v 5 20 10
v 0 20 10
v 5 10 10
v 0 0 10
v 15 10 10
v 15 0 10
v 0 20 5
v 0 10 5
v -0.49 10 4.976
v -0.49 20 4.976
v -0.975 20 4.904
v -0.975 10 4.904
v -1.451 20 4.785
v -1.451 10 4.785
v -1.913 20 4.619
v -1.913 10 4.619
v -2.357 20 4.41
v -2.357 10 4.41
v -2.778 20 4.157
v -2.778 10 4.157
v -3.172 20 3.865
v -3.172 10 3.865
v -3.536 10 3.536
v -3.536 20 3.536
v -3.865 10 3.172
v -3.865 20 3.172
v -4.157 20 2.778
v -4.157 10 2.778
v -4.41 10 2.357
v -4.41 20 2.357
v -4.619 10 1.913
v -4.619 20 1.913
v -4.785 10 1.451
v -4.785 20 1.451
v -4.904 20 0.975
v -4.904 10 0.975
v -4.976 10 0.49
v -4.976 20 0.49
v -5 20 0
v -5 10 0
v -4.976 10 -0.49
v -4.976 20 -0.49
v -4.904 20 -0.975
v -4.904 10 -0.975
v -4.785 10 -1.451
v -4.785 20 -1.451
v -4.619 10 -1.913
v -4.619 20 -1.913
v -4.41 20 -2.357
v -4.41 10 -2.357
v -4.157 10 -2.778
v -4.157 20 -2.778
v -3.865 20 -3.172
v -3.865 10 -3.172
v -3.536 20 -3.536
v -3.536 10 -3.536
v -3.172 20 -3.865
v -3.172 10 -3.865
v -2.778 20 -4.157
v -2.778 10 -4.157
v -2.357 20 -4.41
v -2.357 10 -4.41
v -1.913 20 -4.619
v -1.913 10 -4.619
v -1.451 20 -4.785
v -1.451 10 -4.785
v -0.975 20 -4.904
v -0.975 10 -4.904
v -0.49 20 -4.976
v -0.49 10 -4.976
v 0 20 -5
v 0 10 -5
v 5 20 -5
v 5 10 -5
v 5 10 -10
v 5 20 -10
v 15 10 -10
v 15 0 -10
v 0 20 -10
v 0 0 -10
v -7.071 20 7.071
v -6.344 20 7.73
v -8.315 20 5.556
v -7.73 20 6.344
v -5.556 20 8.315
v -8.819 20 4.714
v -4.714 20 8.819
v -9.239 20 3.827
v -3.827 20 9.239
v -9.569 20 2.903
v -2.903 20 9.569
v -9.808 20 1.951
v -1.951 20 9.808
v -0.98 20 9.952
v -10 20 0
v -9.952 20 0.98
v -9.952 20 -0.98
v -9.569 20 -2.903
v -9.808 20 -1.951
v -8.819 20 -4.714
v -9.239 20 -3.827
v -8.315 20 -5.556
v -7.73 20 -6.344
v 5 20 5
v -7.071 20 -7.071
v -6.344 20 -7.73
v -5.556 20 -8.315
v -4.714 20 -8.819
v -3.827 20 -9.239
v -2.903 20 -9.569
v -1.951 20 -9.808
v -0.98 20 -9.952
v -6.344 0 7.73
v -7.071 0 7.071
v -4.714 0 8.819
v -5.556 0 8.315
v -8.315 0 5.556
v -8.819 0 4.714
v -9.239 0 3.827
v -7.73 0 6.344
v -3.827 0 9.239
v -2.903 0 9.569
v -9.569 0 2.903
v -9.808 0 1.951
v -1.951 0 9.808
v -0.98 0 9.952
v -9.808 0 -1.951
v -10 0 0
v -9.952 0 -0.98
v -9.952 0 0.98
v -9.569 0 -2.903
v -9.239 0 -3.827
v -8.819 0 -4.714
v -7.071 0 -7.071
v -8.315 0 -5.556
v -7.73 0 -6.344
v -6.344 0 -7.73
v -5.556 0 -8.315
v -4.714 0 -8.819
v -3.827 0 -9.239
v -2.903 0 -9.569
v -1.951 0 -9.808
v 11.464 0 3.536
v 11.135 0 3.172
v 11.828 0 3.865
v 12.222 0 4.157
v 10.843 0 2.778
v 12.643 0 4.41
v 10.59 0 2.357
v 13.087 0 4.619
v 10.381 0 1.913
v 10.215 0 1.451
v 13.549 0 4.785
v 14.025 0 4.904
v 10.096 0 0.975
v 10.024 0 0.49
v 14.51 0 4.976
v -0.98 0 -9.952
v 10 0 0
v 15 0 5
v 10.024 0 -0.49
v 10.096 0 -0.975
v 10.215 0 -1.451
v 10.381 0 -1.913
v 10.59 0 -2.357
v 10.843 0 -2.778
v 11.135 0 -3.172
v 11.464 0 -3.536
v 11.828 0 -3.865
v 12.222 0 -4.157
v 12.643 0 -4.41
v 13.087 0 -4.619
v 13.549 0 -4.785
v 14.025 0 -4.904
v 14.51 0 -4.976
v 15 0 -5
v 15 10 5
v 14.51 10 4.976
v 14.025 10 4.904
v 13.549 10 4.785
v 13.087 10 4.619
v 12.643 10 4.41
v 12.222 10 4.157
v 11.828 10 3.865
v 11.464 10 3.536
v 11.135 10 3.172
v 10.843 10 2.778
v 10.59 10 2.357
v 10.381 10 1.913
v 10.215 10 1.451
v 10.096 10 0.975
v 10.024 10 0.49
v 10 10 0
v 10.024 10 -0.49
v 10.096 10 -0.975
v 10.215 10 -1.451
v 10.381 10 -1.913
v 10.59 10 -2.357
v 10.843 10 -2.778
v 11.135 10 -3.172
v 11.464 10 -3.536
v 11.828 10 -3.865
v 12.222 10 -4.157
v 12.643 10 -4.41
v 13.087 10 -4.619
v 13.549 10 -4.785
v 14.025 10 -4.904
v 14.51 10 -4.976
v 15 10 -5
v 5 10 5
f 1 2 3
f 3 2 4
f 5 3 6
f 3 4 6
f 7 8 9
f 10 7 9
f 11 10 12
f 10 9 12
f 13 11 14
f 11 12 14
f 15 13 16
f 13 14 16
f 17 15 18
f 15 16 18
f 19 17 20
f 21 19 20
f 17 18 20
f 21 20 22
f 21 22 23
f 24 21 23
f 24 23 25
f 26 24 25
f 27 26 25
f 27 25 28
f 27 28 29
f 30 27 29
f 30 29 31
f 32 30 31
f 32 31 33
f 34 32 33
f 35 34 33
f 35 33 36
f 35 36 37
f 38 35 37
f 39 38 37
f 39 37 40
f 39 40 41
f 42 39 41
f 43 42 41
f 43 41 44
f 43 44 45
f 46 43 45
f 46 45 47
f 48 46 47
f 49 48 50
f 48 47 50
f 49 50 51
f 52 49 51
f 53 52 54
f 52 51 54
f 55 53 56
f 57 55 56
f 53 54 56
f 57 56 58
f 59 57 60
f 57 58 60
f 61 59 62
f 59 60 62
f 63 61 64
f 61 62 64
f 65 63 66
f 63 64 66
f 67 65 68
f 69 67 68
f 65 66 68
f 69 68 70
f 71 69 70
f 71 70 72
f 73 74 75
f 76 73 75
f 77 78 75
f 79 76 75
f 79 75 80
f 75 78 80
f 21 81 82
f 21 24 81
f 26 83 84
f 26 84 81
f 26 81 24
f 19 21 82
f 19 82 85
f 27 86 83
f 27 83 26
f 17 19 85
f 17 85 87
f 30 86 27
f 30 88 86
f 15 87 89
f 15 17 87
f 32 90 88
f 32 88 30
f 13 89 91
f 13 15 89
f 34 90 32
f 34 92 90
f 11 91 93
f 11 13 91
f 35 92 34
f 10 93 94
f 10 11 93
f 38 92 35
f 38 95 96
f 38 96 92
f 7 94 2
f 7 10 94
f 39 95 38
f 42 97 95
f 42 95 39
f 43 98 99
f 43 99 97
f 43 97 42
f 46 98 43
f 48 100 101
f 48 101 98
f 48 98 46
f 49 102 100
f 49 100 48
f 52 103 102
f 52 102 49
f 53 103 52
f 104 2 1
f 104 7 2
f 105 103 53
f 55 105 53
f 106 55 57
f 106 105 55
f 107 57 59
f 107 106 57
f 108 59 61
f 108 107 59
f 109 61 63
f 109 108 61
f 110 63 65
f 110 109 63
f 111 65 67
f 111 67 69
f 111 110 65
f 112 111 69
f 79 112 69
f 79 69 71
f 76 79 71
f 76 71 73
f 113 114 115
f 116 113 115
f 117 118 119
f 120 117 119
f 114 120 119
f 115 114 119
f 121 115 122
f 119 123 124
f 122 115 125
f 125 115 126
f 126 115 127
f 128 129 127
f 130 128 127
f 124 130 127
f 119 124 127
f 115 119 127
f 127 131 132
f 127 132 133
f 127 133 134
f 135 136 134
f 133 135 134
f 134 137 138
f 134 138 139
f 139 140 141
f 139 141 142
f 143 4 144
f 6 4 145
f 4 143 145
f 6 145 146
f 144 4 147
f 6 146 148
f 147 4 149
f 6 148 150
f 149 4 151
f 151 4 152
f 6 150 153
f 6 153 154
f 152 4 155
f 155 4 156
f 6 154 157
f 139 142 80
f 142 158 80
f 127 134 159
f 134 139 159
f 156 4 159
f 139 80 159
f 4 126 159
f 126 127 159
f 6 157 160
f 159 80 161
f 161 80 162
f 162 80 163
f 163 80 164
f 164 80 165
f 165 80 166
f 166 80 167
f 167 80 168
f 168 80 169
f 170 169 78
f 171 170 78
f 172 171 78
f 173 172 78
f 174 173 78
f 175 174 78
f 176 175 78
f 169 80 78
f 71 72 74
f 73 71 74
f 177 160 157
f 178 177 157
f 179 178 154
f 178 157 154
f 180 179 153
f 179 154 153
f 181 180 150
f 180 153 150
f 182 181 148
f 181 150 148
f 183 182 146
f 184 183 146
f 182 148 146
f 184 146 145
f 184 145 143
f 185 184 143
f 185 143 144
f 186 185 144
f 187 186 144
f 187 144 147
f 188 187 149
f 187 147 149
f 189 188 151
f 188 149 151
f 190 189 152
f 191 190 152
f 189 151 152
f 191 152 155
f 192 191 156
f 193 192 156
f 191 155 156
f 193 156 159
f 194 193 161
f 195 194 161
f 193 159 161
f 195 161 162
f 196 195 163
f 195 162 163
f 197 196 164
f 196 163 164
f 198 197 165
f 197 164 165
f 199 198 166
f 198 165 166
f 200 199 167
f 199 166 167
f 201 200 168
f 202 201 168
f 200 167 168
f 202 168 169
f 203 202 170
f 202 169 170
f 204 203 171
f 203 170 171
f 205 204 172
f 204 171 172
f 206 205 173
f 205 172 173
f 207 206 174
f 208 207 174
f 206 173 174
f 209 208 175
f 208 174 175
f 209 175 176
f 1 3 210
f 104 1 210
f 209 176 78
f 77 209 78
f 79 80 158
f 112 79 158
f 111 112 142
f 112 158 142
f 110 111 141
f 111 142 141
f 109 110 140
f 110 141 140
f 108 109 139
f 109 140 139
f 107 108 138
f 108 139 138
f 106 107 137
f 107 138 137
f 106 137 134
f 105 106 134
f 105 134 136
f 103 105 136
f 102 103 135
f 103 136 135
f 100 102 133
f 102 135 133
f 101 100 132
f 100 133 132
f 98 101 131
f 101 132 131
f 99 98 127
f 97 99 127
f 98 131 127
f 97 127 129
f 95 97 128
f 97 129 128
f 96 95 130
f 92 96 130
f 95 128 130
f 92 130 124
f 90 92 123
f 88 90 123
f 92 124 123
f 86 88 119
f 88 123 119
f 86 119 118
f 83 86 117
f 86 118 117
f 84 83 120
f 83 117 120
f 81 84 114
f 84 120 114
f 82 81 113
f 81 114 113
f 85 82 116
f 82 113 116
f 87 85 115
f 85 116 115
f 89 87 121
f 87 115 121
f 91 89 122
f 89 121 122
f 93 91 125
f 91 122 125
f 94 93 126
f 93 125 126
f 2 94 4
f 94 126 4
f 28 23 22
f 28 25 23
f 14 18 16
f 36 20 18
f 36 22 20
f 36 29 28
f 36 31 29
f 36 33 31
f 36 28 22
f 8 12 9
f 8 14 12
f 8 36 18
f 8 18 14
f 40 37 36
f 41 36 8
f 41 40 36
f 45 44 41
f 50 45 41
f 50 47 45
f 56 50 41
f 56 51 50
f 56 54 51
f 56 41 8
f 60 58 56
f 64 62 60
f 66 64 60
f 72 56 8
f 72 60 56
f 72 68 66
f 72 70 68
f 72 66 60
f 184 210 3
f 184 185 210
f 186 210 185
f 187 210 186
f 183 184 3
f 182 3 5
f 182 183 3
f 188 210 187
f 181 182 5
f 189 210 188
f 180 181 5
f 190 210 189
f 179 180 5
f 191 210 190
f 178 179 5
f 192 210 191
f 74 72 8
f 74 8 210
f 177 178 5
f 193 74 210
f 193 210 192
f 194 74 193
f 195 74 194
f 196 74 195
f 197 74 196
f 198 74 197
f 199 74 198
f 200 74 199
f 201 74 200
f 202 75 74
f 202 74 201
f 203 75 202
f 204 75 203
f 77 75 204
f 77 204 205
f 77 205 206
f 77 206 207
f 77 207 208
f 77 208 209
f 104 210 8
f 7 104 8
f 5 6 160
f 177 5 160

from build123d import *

# Parameters (mm, degrees)
EXTRUDE_1_DEPTH = 10
EXTRUDE_2_DEPTH = 20


with BuildPart() as part:
    # 草圖1 → 填料-伸長1 (new body)
    with BuildSketch(Plane(origin=(0, 0, 0), x_dir=(1, 0, 0), z_dir=(0, 1, 0))):
        with BuildLine():
            Line((15, 10), (0, 10))
            ThreePointArc((0, 10), (-10, 0), (0, -10))
            Line((0, -10), (15, -10))
            Line((15, -10), (15, -5))
            ThreePointArc((15, -5), (10, 0), (15, 5))
            Line((15, 5), (15, 10))
        make_face()
    extrude(amount=EXTRUDE_1_DEPTH)

    # 草圖1<3> → 填料-伸長2 (add)
    with BuildSketch(Plane(origin=(0, 0, 0), x_dir=(1, 0, 0), z_dir=(0, 1, 0))):
        with BuildLine():
            Line((5, 5), (5, 10))
            Line((5, 10), (0, 10))
            ThreePointArc((0, 10), (-10, 0), (0, -10))
            Line((0, -10), (5, -10))
            Line((5, -10), (5, -5))
            Line((5, -5), (0, -5))
            ThreePointArc((0, -5), (-5, 0), (0, 5))
            Line((0, 5), (5, 5))
        make_face()
    extrude(amount=EXTRUDE_2_DEPTH)


solid = part.part
